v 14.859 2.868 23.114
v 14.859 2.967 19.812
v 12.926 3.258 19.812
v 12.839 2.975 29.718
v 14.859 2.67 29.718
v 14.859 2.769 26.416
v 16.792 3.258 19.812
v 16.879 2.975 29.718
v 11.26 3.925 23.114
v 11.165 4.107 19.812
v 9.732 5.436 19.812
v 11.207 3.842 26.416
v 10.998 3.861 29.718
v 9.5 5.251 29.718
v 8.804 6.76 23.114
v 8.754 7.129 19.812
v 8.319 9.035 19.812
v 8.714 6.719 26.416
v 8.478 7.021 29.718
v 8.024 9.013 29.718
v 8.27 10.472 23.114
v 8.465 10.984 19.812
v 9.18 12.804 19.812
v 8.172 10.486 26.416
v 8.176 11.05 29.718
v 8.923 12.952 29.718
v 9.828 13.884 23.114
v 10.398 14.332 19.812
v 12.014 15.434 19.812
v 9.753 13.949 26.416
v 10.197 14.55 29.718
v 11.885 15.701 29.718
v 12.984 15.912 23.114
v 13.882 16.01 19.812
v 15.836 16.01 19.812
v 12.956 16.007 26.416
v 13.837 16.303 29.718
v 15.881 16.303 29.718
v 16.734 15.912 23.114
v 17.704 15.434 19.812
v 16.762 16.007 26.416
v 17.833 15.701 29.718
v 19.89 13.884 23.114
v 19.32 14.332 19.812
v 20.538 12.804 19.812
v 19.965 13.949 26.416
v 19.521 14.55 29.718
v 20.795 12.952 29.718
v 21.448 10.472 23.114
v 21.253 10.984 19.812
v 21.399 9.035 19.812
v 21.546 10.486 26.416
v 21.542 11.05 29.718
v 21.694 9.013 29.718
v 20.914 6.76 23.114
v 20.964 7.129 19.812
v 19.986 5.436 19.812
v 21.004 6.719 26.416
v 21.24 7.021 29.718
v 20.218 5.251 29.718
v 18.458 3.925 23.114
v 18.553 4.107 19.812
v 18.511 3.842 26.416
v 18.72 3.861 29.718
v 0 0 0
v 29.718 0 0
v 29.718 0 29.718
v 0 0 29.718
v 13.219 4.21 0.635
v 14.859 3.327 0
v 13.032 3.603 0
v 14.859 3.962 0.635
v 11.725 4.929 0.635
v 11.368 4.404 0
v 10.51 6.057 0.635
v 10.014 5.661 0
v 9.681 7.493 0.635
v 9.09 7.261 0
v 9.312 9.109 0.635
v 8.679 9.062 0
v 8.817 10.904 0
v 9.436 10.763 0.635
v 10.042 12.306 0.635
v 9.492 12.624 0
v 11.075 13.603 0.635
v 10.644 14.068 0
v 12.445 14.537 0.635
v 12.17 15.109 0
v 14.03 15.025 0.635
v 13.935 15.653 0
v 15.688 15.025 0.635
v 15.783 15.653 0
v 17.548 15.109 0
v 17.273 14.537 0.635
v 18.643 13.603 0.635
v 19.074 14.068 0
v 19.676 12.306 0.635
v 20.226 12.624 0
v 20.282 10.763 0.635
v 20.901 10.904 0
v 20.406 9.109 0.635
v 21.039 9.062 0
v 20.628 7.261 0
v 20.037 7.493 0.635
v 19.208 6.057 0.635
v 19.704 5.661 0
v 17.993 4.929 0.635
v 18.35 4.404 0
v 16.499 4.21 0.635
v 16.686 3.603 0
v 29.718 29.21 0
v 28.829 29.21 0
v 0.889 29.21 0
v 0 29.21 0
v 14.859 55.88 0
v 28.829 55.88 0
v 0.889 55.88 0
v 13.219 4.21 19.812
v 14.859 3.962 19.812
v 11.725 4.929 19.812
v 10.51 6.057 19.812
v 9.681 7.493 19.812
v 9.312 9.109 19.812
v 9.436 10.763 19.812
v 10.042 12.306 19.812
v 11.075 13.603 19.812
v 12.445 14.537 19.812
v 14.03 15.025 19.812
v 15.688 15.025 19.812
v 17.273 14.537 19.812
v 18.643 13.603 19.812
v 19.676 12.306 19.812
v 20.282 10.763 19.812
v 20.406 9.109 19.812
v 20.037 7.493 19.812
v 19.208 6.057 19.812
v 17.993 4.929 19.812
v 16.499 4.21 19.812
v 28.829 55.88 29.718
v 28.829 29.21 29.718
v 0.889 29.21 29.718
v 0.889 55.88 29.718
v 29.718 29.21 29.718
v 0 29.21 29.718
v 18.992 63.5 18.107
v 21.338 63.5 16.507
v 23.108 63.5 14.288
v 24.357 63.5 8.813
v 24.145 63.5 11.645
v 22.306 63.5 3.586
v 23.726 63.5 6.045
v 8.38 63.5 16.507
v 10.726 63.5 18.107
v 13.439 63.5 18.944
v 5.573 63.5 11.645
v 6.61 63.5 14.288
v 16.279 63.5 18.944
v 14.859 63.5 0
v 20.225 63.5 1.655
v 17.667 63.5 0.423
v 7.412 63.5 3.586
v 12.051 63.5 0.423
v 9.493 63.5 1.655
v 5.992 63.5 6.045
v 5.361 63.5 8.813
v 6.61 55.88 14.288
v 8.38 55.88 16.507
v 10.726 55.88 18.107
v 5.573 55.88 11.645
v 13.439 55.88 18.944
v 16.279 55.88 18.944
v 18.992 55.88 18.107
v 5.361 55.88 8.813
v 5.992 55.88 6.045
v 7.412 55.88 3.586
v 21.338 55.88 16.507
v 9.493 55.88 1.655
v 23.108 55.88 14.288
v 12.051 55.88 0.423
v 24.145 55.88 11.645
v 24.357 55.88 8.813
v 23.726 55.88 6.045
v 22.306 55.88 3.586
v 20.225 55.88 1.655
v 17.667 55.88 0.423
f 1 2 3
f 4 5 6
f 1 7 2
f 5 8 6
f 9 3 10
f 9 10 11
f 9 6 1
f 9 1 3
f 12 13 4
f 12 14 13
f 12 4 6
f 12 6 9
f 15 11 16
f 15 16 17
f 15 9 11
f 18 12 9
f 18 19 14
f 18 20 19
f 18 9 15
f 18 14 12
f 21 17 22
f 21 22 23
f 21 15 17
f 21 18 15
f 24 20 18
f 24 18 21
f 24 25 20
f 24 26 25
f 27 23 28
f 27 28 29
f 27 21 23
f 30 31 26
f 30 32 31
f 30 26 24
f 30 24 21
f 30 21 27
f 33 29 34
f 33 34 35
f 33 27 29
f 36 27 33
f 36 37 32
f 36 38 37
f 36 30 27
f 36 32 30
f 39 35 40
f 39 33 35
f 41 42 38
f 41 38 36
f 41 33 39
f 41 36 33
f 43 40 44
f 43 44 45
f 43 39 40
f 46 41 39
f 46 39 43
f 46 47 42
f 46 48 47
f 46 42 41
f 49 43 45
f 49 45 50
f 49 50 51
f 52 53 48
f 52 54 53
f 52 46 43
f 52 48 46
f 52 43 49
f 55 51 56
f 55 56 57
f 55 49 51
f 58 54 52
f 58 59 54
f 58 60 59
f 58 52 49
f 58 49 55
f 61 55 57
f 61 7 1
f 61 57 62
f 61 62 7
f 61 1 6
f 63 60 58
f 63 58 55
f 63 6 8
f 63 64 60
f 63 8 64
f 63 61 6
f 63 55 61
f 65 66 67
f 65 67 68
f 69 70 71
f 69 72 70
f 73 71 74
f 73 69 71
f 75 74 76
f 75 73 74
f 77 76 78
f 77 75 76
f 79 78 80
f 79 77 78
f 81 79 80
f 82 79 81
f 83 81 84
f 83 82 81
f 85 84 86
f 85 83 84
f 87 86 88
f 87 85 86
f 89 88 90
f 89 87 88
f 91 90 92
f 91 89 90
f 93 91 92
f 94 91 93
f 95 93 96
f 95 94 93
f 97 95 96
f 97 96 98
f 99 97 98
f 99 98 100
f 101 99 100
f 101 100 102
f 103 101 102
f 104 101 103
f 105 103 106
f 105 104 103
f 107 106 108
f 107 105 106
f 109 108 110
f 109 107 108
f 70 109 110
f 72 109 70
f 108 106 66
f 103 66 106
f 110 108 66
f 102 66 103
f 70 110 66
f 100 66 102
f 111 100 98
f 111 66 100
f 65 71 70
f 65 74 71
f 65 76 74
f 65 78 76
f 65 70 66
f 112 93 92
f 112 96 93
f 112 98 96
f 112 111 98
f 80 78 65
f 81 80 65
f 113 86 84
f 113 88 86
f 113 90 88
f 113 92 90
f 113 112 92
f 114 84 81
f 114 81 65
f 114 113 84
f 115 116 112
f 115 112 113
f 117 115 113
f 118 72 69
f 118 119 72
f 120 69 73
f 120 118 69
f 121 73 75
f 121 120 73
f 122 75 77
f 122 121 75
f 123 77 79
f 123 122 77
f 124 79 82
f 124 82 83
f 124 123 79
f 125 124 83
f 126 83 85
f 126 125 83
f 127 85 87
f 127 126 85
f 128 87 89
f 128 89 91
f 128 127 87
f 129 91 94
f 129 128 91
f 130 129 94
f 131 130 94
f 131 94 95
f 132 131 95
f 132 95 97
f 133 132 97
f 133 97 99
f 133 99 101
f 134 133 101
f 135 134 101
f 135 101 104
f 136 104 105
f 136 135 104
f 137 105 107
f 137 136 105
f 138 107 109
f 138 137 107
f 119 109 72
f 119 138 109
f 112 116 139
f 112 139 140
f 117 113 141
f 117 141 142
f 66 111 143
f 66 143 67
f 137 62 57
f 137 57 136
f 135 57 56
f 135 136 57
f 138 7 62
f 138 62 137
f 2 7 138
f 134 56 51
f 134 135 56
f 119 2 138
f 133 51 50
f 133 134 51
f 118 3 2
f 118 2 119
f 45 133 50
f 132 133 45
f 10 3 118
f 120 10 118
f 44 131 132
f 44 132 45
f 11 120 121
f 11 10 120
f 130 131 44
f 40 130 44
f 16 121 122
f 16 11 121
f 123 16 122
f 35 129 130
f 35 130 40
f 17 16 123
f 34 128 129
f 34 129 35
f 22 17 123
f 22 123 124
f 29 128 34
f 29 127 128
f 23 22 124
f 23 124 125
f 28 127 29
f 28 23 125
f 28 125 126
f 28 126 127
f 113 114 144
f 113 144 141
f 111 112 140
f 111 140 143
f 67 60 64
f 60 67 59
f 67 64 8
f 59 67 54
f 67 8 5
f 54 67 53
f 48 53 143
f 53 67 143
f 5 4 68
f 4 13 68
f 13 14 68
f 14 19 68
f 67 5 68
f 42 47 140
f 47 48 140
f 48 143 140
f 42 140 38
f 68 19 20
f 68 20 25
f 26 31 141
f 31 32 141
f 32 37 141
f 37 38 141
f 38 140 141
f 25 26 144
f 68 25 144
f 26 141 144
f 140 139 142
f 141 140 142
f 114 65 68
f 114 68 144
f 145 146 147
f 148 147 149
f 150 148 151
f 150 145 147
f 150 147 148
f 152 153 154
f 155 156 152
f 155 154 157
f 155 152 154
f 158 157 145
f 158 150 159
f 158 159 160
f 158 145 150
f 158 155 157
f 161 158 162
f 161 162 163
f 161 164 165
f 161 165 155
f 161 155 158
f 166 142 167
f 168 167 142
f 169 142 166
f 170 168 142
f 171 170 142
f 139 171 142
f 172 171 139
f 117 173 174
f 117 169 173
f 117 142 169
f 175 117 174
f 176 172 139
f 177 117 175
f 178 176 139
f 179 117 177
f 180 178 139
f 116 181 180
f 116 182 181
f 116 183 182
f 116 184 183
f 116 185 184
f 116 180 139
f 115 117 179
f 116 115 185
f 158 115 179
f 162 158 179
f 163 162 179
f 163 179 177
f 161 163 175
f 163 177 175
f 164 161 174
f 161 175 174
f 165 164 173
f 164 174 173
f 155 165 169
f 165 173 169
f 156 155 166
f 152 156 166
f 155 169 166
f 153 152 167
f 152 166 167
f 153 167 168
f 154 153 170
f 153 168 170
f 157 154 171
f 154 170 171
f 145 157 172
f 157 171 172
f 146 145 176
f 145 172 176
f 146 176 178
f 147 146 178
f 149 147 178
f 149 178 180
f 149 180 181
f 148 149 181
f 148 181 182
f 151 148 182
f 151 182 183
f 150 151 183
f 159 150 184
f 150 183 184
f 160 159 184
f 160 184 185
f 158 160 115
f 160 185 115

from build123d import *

# Parameters (mm, degrees)
BOSS_EXTRUDE1_DEPTH = 29.718
SKETCH3_R           = 9.525
BOSS_EXTRUDE2_DEPTH = 7.62


with BuildPart() as part:
    # Sketch1 → Boss-Extrude1 (new body)
    with BuildSketch(Plane.XY):
        Polygon((0, 0), (0, 29.21), (0.889, 29.21), (0.889, 55.88), (28.829, 55.88), (28.829, 29.21), (29.718, 29.21), (29.718, 0), align=None)
    extrude(amount=BOSS_EXTRUDE1_DEPTH)

    # Sketch3 → Boss-Extrude2 (add)
    with BuildSketch(Plane(origin=(0, 55.88, 0), x_dir=(1, 0, 0), z_dir=(0, 1, 0))):
        with Locations(Location((14.859, -9.525, 0), (0, 0, 90))):
            Circle(SKETCH3_R)
    extrude(amount=BOSS_EXTRUDE2_DEPTH)

    # Sketch13 → 1/4 NPT Tapped Hole1 (revolve, cut)
    with BuildSketch(Plane(origin=(14.859, 9.525, 29.718), x_dir=(0, -1, 0), z_dir=(1, 0, 0))):
        Polygon((0, 0), (0, 29.718), (6.1976, 29.718), (5.5626, 29.083), (5.5626, 9.906), (6.557984794, 9.906), (6.8545837, 0), align=None)
    revolve(axis=Axis((14.859, 9.525, 36.068), (0, 0, -1)), mode=Mode.SUBTRACT)


solid = part.part
